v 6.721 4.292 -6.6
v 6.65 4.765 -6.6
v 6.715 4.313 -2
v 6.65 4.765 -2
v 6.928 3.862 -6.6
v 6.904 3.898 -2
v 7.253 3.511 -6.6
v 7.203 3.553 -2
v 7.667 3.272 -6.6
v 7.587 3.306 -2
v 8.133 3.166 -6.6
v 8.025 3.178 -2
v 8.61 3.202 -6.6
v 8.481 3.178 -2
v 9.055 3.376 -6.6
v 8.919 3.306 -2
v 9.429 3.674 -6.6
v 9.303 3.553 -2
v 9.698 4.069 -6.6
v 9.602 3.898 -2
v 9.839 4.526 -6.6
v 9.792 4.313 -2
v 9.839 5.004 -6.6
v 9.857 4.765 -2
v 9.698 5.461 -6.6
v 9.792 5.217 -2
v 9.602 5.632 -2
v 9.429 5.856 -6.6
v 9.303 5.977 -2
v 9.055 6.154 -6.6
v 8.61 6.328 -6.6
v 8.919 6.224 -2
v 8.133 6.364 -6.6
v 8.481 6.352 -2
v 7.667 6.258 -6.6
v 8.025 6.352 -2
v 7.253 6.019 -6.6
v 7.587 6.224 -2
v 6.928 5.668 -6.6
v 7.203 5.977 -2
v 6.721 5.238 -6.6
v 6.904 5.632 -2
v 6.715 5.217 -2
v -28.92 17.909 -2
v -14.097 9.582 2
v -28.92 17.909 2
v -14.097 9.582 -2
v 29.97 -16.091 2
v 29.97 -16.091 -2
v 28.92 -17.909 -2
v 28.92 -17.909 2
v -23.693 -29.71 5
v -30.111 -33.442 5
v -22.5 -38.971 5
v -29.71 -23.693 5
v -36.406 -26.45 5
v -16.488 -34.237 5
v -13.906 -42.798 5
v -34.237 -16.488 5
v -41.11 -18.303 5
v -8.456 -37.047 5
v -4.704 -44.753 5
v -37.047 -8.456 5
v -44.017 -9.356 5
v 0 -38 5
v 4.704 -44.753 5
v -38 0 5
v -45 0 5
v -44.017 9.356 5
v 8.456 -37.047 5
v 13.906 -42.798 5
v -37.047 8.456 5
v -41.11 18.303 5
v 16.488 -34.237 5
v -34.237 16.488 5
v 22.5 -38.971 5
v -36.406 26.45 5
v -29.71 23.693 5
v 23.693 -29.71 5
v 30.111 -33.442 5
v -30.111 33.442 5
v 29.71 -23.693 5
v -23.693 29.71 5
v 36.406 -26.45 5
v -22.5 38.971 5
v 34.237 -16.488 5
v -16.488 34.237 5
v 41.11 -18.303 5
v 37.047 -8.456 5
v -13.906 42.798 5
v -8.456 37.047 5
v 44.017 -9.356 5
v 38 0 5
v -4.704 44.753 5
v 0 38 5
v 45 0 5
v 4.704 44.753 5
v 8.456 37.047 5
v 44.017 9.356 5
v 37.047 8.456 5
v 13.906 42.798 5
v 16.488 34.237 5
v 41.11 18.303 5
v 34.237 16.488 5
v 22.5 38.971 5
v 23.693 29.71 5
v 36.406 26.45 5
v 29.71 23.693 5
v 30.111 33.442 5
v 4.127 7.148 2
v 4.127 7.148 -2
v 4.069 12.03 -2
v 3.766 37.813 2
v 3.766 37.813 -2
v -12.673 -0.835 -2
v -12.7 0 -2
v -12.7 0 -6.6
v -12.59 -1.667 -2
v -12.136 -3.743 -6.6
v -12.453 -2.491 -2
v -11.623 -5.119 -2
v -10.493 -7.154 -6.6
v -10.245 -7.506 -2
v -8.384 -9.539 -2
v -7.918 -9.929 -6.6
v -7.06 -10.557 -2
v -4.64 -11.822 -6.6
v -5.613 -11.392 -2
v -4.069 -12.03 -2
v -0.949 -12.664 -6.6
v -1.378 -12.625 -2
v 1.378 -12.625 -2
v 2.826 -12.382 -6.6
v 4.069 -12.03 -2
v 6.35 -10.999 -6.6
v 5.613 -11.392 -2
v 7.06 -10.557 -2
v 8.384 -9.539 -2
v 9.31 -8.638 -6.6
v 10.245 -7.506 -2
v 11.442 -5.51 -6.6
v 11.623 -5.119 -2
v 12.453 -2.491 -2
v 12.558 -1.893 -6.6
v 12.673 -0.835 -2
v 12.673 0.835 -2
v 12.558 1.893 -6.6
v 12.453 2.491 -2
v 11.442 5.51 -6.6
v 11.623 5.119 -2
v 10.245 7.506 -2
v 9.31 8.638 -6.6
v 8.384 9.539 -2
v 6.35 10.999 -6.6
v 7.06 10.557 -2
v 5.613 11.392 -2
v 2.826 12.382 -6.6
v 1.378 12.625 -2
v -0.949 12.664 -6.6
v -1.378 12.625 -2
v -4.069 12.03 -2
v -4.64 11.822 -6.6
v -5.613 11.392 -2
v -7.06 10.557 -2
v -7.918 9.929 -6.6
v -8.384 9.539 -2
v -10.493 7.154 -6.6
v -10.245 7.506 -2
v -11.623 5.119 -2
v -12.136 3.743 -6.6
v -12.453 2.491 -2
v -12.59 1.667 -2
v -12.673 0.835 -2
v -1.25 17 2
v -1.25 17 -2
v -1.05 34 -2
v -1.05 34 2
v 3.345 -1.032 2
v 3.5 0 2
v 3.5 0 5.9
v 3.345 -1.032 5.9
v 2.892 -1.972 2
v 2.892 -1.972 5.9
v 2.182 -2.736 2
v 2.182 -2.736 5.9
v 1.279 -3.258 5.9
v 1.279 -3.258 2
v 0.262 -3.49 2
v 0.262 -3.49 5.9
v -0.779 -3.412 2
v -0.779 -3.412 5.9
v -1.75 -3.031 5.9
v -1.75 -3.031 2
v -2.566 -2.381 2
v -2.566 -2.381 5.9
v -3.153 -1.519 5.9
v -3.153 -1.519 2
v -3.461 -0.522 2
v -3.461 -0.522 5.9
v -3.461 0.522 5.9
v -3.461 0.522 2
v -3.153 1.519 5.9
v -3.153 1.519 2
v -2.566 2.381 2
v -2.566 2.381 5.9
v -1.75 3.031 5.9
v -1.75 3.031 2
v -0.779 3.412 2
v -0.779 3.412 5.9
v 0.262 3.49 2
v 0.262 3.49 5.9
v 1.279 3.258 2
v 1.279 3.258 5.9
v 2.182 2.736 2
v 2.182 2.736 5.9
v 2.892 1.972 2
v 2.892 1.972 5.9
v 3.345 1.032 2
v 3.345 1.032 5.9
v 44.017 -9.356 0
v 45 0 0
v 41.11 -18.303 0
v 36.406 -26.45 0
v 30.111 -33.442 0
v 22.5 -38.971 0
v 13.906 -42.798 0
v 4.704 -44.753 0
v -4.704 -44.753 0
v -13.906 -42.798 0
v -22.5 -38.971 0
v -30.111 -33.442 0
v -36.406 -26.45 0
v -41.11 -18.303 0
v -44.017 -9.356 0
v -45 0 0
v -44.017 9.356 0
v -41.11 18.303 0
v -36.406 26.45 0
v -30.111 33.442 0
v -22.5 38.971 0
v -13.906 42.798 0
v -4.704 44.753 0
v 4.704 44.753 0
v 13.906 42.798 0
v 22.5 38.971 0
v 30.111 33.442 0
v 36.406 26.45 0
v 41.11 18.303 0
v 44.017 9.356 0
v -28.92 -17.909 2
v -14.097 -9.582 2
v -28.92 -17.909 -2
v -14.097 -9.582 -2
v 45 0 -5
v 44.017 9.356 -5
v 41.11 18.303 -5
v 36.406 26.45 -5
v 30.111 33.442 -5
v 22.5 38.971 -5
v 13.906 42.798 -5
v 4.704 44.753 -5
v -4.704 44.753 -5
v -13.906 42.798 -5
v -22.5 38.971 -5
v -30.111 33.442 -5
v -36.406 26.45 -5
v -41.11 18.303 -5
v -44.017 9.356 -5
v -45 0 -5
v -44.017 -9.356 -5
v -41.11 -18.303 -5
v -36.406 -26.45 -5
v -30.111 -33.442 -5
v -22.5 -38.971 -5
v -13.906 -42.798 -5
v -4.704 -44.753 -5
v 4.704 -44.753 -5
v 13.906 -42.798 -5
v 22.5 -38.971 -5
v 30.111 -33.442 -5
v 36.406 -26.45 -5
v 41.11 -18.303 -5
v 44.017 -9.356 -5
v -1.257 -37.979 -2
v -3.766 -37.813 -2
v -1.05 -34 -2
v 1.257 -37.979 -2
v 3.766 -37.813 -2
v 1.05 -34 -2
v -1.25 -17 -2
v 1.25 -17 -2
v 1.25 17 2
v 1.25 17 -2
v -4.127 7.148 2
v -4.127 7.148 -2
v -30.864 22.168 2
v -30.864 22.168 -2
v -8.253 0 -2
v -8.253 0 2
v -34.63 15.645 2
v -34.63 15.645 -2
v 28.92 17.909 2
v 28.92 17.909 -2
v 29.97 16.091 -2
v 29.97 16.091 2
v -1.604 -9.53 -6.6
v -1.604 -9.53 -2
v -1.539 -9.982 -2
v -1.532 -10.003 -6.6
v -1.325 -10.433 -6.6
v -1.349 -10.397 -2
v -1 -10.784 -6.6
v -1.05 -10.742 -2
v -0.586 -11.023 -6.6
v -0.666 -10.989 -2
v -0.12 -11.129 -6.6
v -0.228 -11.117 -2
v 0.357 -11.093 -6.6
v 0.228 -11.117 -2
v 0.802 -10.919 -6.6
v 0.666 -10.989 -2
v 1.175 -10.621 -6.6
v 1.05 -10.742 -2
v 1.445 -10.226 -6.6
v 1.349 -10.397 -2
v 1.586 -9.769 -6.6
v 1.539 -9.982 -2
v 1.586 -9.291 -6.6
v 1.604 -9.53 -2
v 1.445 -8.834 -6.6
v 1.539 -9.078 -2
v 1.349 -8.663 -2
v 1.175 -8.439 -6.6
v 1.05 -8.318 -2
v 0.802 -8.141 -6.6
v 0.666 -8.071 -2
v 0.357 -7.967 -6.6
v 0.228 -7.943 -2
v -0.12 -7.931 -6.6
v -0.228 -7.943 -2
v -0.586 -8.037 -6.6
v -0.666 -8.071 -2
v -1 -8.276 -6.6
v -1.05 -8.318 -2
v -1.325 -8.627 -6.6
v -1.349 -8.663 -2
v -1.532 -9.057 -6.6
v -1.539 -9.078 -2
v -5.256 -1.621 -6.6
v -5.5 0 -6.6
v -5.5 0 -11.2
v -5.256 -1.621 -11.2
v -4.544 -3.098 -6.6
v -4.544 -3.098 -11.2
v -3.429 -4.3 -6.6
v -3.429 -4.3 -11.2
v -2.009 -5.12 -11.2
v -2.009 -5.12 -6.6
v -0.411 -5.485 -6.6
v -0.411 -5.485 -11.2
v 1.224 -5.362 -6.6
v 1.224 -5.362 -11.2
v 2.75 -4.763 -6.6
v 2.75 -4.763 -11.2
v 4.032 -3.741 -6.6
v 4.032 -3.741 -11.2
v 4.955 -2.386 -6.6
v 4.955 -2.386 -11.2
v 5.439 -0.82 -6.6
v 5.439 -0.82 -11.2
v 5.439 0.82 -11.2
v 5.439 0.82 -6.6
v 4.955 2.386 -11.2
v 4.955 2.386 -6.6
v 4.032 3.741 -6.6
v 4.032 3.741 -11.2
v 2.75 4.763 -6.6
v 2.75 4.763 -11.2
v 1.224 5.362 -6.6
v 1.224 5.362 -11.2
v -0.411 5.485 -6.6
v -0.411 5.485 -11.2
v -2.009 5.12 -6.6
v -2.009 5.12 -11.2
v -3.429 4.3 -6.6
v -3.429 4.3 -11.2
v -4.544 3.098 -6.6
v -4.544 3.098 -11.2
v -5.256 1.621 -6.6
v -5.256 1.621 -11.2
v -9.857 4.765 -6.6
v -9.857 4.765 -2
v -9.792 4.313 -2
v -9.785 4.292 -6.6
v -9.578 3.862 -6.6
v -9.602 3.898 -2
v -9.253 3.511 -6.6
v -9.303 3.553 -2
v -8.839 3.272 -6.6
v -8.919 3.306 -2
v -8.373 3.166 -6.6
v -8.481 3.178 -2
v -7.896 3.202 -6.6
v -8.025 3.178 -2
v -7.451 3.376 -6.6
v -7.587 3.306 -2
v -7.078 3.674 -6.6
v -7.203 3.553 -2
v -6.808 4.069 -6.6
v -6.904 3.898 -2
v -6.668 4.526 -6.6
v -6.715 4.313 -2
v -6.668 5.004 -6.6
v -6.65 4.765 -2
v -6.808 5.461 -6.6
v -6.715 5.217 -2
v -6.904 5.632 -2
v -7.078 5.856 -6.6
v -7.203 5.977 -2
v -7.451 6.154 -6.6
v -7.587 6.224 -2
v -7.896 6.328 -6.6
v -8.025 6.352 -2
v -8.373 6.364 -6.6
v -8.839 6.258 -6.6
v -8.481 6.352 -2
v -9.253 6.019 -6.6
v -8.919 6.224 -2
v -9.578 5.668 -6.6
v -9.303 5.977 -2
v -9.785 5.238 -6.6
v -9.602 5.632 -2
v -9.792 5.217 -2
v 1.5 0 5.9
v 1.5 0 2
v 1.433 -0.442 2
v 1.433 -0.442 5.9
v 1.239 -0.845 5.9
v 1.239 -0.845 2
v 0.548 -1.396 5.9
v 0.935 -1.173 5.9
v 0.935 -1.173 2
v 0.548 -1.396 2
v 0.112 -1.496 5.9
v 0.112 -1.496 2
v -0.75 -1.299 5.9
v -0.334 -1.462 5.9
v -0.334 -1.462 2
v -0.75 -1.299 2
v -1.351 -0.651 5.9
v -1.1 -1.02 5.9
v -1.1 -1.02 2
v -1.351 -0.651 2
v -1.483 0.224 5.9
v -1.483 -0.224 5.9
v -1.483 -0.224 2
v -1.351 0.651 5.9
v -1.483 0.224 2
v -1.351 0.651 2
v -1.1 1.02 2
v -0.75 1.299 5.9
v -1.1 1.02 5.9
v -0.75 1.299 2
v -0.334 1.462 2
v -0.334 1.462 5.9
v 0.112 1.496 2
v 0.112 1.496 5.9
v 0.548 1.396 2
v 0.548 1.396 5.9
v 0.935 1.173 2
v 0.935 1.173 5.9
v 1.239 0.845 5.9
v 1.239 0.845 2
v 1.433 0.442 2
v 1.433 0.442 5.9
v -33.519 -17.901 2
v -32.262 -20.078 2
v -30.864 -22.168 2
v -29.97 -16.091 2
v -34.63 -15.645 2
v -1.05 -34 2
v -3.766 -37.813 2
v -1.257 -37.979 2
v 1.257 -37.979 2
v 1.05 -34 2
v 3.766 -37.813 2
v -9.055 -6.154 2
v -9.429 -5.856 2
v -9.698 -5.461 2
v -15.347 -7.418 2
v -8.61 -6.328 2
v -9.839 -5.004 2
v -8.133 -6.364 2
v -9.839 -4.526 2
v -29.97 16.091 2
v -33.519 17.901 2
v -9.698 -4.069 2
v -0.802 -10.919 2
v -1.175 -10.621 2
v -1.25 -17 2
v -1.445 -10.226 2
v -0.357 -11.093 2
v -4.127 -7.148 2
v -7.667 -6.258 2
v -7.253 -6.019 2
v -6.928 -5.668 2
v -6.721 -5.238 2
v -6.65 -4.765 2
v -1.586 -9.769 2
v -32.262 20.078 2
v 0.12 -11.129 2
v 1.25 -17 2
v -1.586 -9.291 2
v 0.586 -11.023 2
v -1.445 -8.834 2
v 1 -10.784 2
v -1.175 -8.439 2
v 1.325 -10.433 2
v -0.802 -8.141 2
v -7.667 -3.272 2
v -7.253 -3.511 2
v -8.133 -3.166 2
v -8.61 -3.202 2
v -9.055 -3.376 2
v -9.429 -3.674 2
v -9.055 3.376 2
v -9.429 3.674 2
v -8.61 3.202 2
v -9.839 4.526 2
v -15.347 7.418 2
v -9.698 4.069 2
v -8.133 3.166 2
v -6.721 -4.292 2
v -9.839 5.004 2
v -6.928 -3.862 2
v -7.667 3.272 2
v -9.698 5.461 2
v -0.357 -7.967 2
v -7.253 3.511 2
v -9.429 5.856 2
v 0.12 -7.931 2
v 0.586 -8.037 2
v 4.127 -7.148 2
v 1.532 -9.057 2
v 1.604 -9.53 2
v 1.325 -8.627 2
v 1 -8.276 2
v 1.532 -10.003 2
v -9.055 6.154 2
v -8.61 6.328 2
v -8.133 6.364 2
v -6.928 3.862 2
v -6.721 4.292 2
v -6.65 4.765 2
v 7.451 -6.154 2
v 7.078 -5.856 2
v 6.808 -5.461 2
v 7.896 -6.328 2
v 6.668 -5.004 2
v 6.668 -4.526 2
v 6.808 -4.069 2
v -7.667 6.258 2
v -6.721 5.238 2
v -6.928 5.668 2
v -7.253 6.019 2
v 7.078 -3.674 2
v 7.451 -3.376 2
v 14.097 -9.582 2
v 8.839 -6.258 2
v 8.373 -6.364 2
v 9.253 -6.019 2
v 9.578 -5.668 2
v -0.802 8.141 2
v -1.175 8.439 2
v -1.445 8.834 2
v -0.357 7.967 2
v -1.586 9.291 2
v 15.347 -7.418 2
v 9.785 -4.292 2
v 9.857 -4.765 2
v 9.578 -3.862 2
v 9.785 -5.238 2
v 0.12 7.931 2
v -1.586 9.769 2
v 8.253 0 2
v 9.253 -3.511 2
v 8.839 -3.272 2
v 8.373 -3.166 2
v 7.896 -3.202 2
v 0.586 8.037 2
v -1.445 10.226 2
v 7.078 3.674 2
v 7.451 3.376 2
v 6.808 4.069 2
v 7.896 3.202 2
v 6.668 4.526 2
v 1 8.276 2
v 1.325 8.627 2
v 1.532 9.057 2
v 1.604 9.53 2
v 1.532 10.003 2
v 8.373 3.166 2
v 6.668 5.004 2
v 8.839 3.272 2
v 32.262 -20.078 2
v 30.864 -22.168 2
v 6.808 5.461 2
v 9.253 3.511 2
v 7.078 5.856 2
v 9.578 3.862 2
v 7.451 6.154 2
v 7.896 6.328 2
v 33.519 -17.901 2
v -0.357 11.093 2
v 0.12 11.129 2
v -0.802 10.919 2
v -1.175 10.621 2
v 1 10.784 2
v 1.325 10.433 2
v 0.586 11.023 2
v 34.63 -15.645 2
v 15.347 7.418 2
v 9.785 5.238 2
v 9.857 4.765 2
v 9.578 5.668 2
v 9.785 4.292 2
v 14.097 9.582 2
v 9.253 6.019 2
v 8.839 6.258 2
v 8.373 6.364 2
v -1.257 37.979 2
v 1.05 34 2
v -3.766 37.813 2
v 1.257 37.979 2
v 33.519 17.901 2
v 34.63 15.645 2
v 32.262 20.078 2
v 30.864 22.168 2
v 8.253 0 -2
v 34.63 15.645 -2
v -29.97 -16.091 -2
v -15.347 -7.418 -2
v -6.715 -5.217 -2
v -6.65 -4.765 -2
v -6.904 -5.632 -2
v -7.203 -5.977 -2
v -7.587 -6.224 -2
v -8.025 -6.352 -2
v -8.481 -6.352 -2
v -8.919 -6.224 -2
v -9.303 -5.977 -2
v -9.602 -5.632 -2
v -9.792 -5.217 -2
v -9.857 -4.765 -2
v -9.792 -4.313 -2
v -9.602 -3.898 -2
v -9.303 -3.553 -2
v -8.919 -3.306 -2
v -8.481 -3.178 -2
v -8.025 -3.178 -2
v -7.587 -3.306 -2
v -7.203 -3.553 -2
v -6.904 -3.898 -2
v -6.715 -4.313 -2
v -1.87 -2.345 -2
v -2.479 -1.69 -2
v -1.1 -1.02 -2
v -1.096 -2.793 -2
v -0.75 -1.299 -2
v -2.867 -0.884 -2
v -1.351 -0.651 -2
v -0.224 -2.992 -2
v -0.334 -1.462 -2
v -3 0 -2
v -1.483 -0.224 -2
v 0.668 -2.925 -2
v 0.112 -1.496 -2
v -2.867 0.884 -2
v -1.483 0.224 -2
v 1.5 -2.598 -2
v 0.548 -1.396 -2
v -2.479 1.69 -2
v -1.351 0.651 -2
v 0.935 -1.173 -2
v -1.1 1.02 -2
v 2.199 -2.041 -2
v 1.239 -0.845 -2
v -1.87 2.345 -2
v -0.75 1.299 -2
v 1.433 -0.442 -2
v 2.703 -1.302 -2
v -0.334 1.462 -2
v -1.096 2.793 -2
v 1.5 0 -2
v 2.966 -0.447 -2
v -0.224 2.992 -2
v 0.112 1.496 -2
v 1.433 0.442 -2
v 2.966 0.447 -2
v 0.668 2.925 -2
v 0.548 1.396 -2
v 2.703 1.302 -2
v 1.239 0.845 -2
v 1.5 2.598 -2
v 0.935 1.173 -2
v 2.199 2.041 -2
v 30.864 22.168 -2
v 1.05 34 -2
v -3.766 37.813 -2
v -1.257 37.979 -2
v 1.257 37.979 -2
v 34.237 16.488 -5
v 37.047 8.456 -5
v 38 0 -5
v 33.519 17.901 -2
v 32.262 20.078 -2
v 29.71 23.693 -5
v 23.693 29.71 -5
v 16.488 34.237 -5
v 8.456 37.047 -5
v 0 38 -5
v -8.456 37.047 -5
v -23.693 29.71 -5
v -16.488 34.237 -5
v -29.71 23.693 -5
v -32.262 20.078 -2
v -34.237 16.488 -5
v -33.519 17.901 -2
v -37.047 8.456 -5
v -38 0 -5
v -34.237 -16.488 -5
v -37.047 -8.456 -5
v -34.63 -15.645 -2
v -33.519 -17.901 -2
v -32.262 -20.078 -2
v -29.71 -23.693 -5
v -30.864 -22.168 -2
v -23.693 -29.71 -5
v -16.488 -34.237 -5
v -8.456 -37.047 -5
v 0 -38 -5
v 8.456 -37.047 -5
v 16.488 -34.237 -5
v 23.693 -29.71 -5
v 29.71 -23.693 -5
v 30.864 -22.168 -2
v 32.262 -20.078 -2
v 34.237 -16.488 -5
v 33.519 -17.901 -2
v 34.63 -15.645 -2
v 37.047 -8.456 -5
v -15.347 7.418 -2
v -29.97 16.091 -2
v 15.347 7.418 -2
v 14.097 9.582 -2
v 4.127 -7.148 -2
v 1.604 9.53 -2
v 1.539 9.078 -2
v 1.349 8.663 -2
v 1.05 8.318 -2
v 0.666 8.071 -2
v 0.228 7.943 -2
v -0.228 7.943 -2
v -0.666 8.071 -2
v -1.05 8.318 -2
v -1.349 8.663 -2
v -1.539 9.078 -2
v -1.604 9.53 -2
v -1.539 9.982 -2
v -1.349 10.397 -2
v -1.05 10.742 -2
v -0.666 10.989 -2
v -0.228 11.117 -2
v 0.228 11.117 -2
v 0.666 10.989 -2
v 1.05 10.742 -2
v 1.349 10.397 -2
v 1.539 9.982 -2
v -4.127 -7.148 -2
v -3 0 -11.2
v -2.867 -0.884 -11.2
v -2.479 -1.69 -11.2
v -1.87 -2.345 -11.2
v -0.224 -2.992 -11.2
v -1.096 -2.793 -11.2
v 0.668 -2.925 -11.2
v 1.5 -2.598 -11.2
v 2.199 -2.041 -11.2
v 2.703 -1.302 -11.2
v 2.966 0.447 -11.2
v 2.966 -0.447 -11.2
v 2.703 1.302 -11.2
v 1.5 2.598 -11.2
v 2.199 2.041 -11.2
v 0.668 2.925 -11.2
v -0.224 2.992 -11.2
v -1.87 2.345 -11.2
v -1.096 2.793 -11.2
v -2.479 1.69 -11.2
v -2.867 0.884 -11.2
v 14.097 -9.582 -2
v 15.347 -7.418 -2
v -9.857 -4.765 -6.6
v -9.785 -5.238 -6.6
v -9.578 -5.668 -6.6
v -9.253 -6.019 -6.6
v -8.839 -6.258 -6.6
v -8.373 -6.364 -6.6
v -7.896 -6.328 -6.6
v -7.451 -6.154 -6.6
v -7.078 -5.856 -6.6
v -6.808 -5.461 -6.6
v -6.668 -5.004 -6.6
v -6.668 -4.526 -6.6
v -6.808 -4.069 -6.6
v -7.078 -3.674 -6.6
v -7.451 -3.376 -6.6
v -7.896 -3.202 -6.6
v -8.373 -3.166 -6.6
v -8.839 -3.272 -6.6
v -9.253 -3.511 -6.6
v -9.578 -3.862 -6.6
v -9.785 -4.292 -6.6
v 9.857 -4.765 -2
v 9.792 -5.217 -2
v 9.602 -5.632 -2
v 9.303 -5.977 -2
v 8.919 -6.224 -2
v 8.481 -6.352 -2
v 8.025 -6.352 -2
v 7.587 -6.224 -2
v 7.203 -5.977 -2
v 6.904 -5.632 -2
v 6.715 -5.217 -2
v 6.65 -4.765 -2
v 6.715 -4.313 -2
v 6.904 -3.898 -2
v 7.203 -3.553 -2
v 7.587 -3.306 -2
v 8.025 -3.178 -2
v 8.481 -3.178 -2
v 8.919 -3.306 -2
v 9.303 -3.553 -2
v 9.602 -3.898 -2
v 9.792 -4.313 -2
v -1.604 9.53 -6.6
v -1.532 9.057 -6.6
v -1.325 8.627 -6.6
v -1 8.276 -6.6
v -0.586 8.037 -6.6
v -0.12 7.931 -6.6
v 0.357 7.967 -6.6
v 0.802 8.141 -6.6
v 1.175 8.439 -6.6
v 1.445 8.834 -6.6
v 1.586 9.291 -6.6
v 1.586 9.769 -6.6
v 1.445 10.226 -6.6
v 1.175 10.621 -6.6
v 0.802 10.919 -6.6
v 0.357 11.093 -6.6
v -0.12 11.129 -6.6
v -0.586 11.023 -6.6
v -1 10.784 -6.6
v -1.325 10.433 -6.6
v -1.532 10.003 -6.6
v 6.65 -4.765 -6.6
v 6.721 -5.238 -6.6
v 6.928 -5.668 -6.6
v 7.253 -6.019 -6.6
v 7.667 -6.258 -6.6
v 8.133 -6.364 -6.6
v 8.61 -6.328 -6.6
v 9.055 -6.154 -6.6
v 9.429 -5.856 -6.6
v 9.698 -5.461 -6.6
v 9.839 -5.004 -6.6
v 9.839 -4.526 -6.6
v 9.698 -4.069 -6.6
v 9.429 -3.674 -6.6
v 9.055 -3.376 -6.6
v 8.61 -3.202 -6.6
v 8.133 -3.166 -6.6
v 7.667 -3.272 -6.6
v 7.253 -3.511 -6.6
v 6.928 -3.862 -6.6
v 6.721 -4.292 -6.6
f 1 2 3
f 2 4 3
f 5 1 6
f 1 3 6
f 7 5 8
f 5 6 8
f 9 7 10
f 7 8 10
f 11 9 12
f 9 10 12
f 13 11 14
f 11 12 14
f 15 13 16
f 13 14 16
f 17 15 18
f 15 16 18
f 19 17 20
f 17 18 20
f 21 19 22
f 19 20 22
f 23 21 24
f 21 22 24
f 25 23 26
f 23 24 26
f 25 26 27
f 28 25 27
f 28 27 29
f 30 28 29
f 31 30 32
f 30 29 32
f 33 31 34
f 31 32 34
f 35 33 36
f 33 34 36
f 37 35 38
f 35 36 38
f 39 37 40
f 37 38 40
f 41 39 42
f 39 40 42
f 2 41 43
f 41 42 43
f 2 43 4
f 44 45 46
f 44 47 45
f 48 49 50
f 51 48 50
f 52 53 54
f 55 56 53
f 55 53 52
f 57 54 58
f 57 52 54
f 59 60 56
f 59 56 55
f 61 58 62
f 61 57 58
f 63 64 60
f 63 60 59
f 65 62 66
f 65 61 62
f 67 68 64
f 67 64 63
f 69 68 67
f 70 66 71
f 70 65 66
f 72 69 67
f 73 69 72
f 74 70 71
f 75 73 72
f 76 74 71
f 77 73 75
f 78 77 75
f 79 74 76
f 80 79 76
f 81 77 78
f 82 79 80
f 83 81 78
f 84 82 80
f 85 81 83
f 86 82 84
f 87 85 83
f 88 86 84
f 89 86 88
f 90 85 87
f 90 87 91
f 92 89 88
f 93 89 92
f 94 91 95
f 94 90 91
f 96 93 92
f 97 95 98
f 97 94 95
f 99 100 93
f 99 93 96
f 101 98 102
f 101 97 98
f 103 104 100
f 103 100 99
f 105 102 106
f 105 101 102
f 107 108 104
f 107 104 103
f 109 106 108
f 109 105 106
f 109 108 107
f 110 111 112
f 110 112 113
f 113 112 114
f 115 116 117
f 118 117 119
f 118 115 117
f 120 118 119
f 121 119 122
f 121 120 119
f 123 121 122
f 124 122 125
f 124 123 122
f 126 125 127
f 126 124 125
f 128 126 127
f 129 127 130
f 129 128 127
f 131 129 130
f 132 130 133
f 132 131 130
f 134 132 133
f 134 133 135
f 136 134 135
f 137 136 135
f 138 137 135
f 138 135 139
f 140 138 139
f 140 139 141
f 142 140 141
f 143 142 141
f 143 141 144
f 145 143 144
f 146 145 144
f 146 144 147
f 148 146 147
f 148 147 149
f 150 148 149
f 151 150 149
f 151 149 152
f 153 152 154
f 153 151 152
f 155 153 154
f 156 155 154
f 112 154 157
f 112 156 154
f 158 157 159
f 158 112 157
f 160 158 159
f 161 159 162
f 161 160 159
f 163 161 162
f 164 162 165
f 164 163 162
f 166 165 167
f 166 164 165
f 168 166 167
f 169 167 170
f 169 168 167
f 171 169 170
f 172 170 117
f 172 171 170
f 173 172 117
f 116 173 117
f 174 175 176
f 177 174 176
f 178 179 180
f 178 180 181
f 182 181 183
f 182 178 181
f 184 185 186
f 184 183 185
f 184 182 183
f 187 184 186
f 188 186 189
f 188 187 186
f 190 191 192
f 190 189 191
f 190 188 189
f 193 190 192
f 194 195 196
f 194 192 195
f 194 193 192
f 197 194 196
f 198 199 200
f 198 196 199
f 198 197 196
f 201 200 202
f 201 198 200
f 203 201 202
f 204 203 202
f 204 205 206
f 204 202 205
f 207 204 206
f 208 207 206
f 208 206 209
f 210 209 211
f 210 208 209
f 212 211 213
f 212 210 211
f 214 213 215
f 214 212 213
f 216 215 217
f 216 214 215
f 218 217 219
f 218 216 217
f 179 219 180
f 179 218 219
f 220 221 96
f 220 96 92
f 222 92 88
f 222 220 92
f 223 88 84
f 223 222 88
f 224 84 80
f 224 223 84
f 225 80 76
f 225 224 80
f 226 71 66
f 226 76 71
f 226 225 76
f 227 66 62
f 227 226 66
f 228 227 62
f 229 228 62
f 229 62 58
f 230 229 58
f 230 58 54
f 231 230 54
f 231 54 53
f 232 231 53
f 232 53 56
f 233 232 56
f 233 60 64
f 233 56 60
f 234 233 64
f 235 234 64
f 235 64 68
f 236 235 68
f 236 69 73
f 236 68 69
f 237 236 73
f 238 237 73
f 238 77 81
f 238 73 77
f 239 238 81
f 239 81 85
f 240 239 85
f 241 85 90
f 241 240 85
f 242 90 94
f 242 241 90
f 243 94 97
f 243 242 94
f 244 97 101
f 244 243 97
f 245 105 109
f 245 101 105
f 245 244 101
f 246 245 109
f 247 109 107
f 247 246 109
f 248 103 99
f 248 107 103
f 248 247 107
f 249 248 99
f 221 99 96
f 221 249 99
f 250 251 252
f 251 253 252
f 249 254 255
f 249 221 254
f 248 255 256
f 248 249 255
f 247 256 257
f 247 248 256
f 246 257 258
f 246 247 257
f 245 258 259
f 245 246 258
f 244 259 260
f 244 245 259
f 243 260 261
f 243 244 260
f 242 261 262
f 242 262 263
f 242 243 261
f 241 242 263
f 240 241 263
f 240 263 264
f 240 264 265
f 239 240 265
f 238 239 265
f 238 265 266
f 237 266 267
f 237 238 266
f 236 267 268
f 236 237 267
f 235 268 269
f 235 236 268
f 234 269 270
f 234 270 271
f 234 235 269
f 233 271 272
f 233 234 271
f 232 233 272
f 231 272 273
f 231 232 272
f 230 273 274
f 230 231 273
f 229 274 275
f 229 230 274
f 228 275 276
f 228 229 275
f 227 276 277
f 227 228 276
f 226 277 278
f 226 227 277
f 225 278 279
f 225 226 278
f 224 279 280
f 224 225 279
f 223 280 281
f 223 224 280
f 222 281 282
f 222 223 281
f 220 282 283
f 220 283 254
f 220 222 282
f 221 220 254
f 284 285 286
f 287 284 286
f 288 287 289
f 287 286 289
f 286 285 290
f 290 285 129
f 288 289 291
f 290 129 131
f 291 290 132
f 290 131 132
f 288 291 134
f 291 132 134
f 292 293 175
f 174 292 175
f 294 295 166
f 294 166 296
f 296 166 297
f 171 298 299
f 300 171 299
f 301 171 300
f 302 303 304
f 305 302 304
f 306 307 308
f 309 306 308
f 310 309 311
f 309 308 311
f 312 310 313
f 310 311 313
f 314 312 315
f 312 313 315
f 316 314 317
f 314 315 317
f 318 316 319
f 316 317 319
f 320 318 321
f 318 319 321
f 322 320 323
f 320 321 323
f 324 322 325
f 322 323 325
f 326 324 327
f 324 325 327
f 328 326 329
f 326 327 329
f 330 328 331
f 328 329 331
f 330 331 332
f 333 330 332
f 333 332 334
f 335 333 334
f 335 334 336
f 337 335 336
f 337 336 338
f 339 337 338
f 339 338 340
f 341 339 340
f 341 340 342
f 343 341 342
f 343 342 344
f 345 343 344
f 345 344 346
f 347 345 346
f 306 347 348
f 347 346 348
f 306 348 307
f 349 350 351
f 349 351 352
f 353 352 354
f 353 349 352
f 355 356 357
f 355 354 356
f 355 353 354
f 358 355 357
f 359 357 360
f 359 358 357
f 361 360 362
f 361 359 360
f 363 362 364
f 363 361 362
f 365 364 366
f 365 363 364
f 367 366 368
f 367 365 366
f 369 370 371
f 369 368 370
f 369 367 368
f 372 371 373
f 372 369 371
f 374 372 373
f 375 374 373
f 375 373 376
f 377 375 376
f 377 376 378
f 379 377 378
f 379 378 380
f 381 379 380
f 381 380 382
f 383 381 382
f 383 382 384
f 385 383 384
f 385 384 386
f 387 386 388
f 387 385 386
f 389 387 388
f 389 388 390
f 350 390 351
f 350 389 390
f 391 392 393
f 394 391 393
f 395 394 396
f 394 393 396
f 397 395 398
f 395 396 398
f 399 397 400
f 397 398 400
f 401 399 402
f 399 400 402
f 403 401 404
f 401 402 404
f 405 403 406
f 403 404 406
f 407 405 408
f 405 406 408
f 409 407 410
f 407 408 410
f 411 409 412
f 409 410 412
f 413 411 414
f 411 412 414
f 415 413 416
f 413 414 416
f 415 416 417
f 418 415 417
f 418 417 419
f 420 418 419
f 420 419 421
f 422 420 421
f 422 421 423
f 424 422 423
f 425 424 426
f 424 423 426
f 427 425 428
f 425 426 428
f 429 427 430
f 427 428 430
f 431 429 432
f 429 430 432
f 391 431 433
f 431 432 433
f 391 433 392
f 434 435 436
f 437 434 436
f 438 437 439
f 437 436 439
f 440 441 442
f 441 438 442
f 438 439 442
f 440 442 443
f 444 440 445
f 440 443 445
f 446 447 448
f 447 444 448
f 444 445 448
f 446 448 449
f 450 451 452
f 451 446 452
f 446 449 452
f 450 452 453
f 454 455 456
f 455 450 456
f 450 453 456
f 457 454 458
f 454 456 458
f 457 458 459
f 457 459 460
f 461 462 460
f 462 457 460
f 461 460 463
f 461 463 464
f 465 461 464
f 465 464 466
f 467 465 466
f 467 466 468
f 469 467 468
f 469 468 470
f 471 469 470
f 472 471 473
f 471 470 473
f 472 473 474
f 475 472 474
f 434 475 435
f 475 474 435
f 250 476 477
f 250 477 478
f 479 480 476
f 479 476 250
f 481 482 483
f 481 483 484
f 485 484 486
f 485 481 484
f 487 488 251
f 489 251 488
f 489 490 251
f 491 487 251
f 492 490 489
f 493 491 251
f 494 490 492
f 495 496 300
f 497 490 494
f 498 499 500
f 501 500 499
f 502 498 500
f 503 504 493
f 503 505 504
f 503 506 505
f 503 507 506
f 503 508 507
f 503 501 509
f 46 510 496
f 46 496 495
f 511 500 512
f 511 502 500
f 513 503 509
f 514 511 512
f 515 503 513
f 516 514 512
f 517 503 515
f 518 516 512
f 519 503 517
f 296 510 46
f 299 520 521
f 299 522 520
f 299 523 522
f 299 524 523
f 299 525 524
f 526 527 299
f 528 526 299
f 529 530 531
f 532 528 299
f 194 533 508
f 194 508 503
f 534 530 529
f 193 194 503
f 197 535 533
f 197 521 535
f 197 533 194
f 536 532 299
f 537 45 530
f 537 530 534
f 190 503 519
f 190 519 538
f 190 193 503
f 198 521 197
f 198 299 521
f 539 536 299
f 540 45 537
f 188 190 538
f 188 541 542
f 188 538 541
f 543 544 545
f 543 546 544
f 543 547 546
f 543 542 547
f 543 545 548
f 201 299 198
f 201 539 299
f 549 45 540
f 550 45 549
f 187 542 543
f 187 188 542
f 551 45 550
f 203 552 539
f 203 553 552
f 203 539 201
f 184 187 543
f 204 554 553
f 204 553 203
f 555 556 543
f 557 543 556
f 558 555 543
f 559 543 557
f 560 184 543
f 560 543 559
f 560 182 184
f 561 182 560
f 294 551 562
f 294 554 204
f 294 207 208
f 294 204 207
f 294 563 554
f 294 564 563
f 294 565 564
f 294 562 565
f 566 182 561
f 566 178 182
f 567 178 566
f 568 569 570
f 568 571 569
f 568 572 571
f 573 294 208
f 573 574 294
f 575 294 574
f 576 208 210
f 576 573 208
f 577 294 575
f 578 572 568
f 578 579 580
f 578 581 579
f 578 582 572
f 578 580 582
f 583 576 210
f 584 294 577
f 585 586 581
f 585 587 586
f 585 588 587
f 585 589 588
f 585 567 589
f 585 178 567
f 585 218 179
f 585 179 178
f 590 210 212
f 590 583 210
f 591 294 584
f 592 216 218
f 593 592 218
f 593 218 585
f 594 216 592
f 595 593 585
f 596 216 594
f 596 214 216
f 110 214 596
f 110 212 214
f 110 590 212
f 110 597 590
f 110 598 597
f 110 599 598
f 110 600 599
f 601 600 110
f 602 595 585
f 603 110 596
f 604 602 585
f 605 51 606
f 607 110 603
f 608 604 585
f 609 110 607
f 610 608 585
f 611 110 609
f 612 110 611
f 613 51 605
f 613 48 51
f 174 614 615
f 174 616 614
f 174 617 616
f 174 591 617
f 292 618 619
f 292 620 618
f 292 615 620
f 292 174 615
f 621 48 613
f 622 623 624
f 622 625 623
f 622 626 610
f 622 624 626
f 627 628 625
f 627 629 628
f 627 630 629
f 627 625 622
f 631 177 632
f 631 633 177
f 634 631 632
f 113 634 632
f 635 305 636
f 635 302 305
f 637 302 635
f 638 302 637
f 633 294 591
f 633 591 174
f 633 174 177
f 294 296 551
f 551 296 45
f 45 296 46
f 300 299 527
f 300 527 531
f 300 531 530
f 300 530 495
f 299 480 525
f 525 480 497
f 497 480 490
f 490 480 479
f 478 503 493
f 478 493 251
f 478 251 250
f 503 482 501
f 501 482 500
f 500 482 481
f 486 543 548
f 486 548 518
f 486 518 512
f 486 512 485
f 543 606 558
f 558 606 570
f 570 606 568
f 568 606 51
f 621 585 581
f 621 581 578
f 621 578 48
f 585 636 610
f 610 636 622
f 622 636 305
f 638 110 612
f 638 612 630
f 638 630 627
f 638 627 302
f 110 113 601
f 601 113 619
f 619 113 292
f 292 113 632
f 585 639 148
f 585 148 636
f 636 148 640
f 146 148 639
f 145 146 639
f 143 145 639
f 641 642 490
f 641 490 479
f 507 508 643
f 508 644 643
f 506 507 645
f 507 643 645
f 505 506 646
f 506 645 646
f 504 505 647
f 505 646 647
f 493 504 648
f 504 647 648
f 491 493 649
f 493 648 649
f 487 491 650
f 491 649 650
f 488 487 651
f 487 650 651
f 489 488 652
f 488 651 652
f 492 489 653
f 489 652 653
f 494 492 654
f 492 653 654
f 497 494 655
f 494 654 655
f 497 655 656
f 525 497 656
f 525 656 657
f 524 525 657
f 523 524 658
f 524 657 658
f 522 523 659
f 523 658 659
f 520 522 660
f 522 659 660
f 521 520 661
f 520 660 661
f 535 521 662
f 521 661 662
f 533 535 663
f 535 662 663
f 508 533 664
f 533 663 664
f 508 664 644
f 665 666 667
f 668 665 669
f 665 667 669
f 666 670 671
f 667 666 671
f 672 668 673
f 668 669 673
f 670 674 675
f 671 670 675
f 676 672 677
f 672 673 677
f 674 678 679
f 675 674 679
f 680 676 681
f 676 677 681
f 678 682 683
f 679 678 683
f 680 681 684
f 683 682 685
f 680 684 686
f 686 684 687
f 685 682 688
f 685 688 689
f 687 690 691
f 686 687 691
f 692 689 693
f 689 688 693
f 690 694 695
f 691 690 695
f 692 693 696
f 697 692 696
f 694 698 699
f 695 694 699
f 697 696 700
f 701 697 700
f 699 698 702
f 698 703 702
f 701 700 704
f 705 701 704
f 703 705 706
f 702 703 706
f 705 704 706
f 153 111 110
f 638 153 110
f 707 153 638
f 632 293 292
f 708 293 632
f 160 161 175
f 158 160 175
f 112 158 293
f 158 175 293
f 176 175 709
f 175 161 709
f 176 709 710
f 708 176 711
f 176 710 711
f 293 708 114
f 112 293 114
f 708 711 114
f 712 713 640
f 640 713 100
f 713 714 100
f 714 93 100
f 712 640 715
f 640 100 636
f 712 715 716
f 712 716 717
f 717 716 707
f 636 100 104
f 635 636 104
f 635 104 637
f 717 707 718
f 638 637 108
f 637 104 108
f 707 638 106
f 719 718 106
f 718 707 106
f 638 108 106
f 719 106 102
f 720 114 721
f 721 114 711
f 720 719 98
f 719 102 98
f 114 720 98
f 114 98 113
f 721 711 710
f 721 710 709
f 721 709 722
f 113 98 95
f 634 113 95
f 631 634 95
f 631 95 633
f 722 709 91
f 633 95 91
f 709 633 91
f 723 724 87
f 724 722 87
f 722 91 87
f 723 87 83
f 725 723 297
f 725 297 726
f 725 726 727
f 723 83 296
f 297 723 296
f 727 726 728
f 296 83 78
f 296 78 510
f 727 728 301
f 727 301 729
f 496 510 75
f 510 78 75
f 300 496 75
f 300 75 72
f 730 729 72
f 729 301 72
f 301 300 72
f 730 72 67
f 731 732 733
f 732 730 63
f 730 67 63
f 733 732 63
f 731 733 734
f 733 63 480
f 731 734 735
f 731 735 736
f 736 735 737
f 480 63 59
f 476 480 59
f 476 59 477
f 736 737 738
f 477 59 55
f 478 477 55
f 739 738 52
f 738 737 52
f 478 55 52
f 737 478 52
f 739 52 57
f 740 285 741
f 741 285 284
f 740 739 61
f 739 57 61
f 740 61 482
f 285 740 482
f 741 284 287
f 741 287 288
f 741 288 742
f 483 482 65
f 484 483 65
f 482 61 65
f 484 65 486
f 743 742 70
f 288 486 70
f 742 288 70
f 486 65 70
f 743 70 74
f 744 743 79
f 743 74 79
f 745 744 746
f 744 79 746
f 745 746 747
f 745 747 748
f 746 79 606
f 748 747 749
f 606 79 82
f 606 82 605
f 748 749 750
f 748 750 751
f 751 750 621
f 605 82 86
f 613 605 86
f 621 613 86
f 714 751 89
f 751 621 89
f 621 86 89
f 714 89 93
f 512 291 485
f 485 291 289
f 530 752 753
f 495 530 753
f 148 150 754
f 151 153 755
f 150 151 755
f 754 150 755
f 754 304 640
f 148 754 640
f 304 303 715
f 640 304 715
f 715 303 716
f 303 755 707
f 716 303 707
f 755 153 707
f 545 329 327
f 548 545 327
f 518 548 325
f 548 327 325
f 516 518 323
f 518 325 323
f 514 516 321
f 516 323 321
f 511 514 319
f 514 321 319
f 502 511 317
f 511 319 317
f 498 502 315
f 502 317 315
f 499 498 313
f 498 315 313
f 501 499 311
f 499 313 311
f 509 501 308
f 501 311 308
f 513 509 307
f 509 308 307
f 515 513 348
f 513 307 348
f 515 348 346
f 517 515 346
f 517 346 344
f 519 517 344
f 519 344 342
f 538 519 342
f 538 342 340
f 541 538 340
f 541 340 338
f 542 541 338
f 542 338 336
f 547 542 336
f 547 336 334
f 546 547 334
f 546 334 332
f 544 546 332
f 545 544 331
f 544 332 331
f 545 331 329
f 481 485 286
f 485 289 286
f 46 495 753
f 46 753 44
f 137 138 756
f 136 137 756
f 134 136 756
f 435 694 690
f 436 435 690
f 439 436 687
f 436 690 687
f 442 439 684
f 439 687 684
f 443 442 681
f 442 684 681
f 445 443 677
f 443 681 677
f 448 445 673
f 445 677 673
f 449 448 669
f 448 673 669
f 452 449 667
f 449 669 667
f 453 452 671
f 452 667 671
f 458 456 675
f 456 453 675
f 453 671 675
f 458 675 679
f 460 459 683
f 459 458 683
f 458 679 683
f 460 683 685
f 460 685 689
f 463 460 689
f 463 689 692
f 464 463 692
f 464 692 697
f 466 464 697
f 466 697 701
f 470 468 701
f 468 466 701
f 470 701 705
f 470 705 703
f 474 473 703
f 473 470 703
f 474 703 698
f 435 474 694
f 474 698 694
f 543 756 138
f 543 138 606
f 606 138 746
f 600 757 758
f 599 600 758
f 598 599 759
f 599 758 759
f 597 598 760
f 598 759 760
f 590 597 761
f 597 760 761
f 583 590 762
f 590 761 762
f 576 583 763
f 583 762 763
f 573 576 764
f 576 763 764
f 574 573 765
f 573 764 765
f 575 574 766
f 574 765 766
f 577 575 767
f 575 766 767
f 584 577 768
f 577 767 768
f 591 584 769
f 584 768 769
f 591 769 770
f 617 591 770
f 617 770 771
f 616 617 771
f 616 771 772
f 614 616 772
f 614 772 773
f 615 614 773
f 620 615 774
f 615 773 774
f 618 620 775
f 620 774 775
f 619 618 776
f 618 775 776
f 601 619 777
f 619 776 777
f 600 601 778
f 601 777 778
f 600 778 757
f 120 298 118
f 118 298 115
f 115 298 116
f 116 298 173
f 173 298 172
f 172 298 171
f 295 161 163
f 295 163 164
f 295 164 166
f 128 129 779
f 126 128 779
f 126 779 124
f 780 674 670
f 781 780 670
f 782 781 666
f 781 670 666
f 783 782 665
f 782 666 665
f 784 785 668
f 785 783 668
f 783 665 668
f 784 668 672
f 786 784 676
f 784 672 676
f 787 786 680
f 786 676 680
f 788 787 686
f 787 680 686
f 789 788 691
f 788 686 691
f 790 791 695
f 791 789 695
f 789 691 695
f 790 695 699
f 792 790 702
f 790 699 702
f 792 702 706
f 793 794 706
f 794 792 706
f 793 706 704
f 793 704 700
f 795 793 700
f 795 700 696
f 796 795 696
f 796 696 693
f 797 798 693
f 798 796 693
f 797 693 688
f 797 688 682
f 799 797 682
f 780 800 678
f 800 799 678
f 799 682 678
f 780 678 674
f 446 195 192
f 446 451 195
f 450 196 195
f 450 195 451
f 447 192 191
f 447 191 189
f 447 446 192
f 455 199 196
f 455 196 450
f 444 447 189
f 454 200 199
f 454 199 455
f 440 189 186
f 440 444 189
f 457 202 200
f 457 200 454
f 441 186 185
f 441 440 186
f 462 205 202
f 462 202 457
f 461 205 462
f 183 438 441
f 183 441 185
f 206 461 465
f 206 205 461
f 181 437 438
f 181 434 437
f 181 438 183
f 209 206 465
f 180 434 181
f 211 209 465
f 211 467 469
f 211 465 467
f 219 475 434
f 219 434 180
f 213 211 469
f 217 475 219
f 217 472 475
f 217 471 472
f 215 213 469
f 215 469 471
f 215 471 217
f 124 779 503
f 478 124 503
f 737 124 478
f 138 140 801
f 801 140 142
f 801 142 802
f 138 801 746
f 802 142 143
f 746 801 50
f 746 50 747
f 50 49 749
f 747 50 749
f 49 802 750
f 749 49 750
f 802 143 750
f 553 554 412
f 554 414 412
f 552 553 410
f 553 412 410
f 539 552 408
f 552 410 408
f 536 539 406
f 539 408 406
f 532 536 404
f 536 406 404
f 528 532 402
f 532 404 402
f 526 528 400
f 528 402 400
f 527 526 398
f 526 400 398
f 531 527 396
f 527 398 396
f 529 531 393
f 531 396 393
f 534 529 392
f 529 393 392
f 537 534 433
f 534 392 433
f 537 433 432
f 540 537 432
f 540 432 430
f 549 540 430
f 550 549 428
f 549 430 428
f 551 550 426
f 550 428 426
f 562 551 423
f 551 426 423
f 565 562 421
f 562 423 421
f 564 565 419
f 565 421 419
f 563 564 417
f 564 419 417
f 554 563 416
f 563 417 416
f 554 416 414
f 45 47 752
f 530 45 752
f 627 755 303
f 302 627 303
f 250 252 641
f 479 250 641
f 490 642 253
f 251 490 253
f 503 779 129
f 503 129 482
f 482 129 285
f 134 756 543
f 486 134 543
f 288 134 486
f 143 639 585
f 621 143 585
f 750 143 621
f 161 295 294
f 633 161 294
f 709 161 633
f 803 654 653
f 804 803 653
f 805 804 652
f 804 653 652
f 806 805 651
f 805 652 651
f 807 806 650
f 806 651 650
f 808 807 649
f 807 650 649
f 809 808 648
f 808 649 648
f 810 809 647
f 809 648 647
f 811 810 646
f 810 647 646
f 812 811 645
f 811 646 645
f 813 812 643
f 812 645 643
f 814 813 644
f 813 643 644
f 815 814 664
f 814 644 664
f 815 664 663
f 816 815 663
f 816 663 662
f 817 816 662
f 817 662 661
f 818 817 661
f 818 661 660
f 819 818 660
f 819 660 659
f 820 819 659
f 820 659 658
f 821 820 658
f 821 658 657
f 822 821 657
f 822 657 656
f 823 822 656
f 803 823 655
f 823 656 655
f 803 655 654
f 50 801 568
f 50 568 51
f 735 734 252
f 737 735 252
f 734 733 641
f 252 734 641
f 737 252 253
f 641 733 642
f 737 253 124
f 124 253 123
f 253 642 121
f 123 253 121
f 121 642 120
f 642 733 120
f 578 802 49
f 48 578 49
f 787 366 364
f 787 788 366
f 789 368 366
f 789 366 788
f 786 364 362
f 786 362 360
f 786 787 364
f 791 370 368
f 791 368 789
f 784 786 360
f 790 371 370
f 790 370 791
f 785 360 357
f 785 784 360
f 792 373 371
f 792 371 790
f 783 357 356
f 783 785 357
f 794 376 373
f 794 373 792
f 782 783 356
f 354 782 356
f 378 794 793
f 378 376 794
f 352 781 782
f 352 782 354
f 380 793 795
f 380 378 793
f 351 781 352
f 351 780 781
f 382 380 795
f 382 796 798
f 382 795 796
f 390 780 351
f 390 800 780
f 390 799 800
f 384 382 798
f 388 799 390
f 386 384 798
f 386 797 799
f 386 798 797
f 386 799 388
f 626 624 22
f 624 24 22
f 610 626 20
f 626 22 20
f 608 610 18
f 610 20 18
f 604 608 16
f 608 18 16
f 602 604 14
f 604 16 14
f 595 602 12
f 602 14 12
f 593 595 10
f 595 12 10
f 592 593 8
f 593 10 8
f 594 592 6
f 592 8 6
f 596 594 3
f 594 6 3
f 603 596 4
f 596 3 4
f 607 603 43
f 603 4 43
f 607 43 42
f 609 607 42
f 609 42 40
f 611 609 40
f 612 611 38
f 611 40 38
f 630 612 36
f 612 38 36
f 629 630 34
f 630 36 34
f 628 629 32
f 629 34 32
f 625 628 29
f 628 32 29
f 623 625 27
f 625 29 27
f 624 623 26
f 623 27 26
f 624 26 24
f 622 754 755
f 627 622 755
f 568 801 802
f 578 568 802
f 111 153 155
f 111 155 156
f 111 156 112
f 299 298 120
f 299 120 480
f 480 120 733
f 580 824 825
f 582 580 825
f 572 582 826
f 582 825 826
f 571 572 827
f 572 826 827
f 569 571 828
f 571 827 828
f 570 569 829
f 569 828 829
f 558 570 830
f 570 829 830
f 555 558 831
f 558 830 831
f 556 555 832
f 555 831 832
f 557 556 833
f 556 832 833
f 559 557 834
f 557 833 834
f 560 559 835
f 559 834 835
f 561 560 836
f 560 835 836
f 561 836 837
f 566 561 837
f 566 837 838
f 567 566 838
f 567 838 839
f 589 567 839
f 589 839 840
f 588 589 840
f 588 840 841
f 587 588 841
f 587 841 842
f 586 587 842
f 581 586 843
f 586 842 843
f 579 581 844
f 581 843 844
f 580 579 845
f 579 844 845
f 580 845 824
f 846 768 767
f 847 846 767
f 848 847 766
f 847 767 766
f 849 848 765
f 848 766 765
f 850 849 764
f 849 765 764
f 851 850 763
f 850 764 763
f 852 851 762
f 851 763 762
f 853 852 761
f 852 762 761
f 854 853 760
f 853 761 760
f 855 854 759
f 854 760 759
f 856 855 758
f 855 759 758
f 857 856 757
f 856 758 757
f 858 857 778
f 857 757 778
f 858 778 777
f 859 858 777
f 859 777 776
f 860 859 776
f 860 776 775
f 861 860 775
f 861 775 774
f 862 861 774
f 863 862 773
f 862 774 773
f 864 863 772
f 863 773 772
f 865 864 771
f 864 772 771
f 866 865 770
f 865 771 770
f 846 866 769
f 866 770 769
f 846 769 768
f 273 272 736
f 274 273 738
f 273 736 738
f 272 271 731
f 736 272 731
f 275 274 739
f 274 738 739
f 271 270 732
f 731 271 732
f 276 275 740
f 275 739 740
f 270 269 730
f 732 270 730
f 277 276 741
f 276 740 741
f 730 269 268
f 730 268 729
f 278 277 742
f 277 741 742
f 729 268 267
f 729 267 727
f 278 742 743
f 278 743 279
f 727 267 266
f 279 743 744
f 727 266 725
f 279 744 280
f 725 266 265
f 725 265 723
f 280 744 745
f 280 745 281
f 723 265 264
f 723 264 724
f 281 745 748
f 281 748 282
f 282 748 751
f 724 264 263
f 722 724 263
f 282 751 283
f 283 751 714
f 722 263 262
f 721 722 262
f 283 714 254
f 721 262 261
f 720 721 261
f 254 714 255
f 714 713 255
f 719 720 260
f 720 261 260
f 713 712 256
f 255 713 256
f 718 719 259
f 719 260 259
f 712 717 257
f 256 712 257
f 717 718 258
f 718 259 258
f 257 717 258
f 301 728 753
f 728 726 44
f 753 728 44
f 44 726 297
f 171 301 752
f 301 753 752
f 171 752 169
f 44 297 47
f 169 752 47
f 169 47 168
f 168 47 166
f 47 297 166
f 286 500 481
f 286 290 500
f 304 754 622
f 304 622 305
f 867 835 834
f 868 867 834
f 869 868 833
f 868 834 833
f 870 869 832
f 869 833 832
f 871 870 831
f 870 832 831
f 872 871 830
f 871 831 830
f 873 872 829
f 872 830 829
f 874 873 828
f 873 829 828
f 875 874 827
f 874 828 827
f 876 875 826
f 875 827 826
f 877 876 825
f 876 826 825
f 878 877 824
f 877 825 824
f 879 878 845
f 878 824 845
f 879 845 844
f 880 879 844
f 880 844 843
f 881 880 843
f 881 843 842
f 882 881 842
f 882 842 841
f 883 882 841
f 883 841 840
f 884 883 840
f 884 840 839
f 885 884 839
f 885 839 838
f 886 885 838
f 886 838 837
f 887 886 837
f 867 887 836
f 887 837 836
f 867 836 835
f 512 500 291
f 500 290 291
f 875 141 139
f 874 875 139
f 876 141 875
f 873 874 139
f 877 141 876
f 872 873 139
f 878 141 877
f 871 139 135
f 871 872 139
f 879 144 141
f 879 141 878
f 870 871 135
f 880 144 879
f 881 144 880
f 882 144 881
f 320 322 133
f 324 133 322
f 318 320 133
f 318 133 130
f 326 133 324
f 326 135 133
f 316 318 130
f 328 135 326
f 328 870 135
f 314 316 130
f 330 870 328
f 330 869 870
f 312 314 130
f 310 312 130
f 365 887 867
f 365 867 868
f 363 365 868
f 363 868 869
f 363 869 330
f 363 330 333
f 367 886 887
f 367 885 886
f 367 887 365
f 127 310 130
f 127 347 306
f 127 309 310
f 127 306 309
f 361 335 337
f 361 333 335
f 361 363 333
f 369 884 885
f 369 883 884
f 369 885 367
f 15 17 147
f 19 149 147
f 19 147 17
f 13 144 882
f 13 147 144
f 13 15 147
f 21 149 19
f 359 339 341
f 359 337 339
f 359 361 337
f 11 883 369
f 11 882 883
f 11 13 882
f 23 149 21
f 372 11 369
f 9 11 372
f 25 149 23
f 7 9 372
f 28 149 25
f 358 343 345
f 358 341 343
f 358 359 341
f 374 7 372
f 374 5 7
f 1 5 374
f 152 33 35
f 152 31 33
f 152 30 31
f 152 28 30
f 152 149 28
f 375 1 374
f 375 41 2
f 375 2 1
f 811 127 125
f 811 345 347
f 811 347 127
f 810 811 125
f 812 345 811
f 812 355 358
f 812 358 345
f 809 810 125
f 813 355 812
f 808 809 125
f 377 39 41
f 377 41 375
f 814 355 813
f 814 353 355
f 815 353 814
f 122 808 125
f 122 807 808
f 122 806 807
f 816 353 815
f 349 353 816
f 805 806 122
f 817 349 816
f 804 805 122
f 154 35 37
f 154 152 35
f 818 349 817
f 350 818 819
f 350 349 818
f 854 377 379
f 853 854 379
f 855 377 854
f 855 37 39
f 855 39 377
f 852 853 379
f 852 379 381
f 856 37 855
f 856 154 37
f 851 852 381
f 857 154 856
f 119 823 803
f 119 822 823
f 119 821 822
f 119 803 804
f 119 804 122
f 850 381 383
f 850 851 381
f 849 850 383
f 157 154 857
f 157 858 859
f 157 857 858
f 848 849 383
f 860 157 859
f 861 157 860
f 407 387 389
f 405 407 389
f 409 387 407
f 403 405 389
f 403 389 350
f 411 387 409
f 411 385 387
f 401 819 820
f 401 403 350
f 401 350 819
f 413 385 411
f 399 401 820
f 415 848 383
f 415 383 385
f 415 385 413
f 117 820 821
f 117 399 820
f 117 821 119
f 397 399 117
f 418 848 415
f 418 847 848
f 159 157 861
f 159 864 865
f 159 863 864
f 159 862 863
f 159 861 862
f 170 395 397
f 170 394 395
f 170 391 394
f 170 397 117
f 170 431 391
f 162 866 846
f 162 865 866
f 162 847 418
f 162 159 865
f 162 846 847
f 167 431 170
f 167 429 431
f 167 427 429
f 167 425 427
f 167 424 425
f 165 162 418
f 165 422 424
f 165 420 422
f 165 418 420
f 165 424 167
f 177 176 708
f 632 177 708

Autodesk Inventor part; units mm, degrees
ref_plane "YZ Plane" through (0, 0, 0) normal (1, 0, 0) x (0, 1, 0)
ref_plane "XZ Plane" through (0, 0, 0) normal (0, 1, 0) x (-1, 0, 0)
ref_plane "XY Plane" through (0, 0, 0) normal (0, 0, 1) x (1, 0, 0)
sketch "Sketch1" plane through (0, 0, 0) normal (0, 0, 1) x (1, 0, 0)
  circle A0 centre (0, 0) radius 45
  circle A1 centre (0, 0) radius 38
  line L0 (0, 0) -> (0, -38) construction
  line L1 (-1.25, -17) -> (1.25, -17)
  line L2 (1.25, -17) -> (1.05, -34)
  line L3 (1.05, -34) -> (-1.05, -34)
  line L4 (-1.25, -17) -> (-1.05, -34)
  circle A2 centre (0, 0) radius 1.5
  circle A3 centre (0, -9.53) radius 1.6035
  circle A4 centre (8.2532, -4.765) radius 1.6035
  circle A5 centre (8.2532, 4.765) radius 1.6035
  circle A6 centre (0, 9.53) radius 1.6035
  circle A7 centre (-8.2532, 4.765) radius 1.6035
  circle A8 centre (-8.2532, -4.765) radius 1.6035
  line L5 (0, -9.53) -> (8.2532, -4.765) construction
  line L6 (4.1266, -7.1475) -> (3.7658, -37.8129)
  line L7 (0, -9.53) -> (-8.2532, -4.765) construction
  line L8 (-4.1266, -7.1475) -> (-3.7658, -37.8129)
  line L9 (14.0974, -9.5825) -> (15.3474, -7.4175)
  line L10 (15.3474, -7.4175) -> (29.9699, -16.0907)
  line L11 (29.9699, -16.0907) -> (28.9199, -17.9093)
  line L12 (14.0974, -9.5825) -> (28.9199, -17.9093)
  line L13 (8.2532, 0) -> (34.6299, -15.6452)
  line L14 (4.1266, -7.1475) -> (30.864, -22.1678)
  line L15 (15.3474, 7.4175) -> (14.0974, 9.5825)
  line L16 (14.0974, 9.5825) -> (28.9199, 17.9093)
  line L17 (28.9199, 17.9093) -> (29.9699, 16.0907)
  line L18 (15.3474, 7.4175) -> (29.9699, 16.0907)
  line L19 (4.1266, 7.1475) -> (30.864, 22.1678)
  line L20 (8.2532, 0) -> (34.6299, 15.6452)
  line L21 (1.25, 17) -> (-1.25, 17)
  line L22 (-1.25, 17) -> (-1.05, 34)
  line L23 (-1.05, 34) -> (1.05, 34)
  line L24 (1.25, 17) -> (1.05, 34)
  line L25 (-4.1266, 7.1475) -> (-3.7658, 37.8129)
  line L26 (4.1266, 7.1475) -> (3.7658, 37.8129)
  line L27 (-14.0974, 9.5825) -> (-15.3474, 7.4175)
  line L28 (-15.3474, 7.4175) -> (-29.9699, 16.0907)
  line L29 (-29.9699, 16.0907) -> (-28.9199, 17.9093)
  line L30 (-14.0974, 9.5825) -> (-28.9199, 17.9093)
  line L31 (-8.2532, 0) -> (-34.6299, 15.6452)
  line L32 (-4.1266, 7.1475) -> (-30.864, 22.1678)
  line L33 (-15.3474, -7.4175) -> (-14.0974, -9.5825)
  line L34 (-14.0974, -9.5825) -> (-28.9199, -17.9093)
  line L35 (-28.9199, -17.9093) -> (-29.9699, -16.0907)
  line L36 (-15.3474, -7.4175) -> (-29.9699, -16.0907)
  line L37 (-4.1266, -7.1475) -> (-30.864, -22.1678)
  line L38 (-8.2532, 0) -> (-34.6299, -15.6452)
  line L39 (3.7658, -37.8129) -> (4.1266, -7.1475)
  line L40 (30.864, -22.1678) -> (4.1266, -7.1475)
  arc A9 (-30.864, -22.1678) -> (-3.7658, -37.8129) centre (0, 0) ccw
  arc A10 (3.7658, -37.8129) -> (30.864, -22.1678) centre (0, 0) ccw
  line L41 (-30.864, -22.1678) -> (-4.1266, -7.1475)
  line L42 (-4.1266, -7.1475) -> (-3.7658, -37.8129)
  line L43 (-34.6299, -15.6452) -> (-8.2532, 0)
  line L44 (-34.6299, 15.6452) -> (-8.2532, 0)
  line L45 (-4.1266, 7.1475) -> (-30.864, 22.1678)
  line L46 (-4.1266, 7.1475) -> (-3.7658, 37.8129)
  line L47 (4.1266, 7.1475) -> (3.7658, 37.8129)
  line L48 (4.1266, 7.1475) -> (30.864, 22.1678)
  line L49 (34.6299, 15.6452) -> (8.2532, 0)
  line L50 (8.2532, 0) -> (34.6299, -15.6452)
  arc A11 (-34.6299, 15.6452) -> (-34.6299, -15.6452) centre (0, 0) ccw
  arc A12 (-3.7658, 37.8129) -> (-30.864, 22.1678) centre (0, 0) ccw
  arc A13 (30.864, 22.1678) -> (3.7658, 37.8129) centre (0, 0) ccw
  arc A14 (34.6299, -15.6452) -> (34.6299, 15.6452) centre (0, 0) ccw
  arc A15 (-3.7658, 37.8129) -> (-30.864, 22.1678) centre (0, 0) ccw
  arc A16 (-3.7658, 37.8129) -> (-30.864, 22.1678) centre (0, 0) ccw
  line L51 (-30.864, 22.1678) -> (-4.1266, 7.1475)
  line L52 (-4.1266, 7.1475) -> (-3.7658, 37.8129)
  point P0 (32.909, -19)
  point P1 (8.2532, -4.765)
  point P2 (32.909, 19)
  point P3 (8.2532, 4.765)
  point P4 (0, 38)
  point P5 (0, 9.53)
  point P6 (-32.909, 19)
  point P7 (-8.2532, 4.765)
  point P8 (-32.909, -19)
  point P9 (-8.2532, -4.765)
  dimension "d0" = 90
  dimension "d1" = 76
  dimension "d2" = 2.1
  dimension "d3" = 2.5
  dimension "d4" = 1.25
  dimension "d5" = 1.05
  dimension "d6" = 3
  dimension "d7" = 17
  dimension "d8" = 4
  dimension "d9" = 9.53
  dimension "d12" = 360
  dimension "d16" = 360
  dimension "d20" = 3.207
extrude "Extrusion1" add sketch "Sketch1" along normal mid plane 10 contours A0
extrude "Extrusion2" add sketch "Sketch1" along normal mid plane 4 contours L20 L13 A1 L14 L6 L8 L37 L38 L31 L32 L25 L26 L19
sketch "Sketch2" plane through (0, 0, 2) normal (0, 0, 1) x (1, 0, 0)
  circle A0 centre (0, 0) radius 1.5 projected
  circle A1 centre (0, 0) radius 3.5
  dimension "d23" = 7
extrude "Extrusion3" add sketch "Sketch2" along normal blind 3.9
sketch "Sketch3" plane through (0, 0, -2) normal (0, 0, -1) x (-1, 0, 0)
  circle A0 centre (8.2532, -4.765) radius 1.6035 projected
  circle A1 centre (8.2532, 4.765) radius 1.6035 projected
  circle A2 centre (0, 9.53) radius 1.6035 projected
  circle A3 centre (-8.2532, 4.765) radius 1.6035 projected
  circle A4 centre (-8.2532, -4.765) radius 1.6035 projected
  circle A5 centre (0, -9.53) radius 1.6035 projected
  circle A6 centre (0, 0) radius 1.5 projected
  circle A7 centre (0, 0) radius 12.7
  circle A8 centre (0, 0) radius 3.5 projected
  circle A9 centre (0, 0) radius 3
  circle A10 centre (0, 0) radius 5.5
  dimension "d26" = 6
  dimension "d27" = 11
  dimension "d28" = 25.4
extrude "Extrusion4" add sketch "Sketch3" along normal blind 4.6 contours A7
extrude "Extrusion5" add sketch "Sketch3" along normal blind 9.2 contours A8 | A10
properties part number "Wheel90mm"
